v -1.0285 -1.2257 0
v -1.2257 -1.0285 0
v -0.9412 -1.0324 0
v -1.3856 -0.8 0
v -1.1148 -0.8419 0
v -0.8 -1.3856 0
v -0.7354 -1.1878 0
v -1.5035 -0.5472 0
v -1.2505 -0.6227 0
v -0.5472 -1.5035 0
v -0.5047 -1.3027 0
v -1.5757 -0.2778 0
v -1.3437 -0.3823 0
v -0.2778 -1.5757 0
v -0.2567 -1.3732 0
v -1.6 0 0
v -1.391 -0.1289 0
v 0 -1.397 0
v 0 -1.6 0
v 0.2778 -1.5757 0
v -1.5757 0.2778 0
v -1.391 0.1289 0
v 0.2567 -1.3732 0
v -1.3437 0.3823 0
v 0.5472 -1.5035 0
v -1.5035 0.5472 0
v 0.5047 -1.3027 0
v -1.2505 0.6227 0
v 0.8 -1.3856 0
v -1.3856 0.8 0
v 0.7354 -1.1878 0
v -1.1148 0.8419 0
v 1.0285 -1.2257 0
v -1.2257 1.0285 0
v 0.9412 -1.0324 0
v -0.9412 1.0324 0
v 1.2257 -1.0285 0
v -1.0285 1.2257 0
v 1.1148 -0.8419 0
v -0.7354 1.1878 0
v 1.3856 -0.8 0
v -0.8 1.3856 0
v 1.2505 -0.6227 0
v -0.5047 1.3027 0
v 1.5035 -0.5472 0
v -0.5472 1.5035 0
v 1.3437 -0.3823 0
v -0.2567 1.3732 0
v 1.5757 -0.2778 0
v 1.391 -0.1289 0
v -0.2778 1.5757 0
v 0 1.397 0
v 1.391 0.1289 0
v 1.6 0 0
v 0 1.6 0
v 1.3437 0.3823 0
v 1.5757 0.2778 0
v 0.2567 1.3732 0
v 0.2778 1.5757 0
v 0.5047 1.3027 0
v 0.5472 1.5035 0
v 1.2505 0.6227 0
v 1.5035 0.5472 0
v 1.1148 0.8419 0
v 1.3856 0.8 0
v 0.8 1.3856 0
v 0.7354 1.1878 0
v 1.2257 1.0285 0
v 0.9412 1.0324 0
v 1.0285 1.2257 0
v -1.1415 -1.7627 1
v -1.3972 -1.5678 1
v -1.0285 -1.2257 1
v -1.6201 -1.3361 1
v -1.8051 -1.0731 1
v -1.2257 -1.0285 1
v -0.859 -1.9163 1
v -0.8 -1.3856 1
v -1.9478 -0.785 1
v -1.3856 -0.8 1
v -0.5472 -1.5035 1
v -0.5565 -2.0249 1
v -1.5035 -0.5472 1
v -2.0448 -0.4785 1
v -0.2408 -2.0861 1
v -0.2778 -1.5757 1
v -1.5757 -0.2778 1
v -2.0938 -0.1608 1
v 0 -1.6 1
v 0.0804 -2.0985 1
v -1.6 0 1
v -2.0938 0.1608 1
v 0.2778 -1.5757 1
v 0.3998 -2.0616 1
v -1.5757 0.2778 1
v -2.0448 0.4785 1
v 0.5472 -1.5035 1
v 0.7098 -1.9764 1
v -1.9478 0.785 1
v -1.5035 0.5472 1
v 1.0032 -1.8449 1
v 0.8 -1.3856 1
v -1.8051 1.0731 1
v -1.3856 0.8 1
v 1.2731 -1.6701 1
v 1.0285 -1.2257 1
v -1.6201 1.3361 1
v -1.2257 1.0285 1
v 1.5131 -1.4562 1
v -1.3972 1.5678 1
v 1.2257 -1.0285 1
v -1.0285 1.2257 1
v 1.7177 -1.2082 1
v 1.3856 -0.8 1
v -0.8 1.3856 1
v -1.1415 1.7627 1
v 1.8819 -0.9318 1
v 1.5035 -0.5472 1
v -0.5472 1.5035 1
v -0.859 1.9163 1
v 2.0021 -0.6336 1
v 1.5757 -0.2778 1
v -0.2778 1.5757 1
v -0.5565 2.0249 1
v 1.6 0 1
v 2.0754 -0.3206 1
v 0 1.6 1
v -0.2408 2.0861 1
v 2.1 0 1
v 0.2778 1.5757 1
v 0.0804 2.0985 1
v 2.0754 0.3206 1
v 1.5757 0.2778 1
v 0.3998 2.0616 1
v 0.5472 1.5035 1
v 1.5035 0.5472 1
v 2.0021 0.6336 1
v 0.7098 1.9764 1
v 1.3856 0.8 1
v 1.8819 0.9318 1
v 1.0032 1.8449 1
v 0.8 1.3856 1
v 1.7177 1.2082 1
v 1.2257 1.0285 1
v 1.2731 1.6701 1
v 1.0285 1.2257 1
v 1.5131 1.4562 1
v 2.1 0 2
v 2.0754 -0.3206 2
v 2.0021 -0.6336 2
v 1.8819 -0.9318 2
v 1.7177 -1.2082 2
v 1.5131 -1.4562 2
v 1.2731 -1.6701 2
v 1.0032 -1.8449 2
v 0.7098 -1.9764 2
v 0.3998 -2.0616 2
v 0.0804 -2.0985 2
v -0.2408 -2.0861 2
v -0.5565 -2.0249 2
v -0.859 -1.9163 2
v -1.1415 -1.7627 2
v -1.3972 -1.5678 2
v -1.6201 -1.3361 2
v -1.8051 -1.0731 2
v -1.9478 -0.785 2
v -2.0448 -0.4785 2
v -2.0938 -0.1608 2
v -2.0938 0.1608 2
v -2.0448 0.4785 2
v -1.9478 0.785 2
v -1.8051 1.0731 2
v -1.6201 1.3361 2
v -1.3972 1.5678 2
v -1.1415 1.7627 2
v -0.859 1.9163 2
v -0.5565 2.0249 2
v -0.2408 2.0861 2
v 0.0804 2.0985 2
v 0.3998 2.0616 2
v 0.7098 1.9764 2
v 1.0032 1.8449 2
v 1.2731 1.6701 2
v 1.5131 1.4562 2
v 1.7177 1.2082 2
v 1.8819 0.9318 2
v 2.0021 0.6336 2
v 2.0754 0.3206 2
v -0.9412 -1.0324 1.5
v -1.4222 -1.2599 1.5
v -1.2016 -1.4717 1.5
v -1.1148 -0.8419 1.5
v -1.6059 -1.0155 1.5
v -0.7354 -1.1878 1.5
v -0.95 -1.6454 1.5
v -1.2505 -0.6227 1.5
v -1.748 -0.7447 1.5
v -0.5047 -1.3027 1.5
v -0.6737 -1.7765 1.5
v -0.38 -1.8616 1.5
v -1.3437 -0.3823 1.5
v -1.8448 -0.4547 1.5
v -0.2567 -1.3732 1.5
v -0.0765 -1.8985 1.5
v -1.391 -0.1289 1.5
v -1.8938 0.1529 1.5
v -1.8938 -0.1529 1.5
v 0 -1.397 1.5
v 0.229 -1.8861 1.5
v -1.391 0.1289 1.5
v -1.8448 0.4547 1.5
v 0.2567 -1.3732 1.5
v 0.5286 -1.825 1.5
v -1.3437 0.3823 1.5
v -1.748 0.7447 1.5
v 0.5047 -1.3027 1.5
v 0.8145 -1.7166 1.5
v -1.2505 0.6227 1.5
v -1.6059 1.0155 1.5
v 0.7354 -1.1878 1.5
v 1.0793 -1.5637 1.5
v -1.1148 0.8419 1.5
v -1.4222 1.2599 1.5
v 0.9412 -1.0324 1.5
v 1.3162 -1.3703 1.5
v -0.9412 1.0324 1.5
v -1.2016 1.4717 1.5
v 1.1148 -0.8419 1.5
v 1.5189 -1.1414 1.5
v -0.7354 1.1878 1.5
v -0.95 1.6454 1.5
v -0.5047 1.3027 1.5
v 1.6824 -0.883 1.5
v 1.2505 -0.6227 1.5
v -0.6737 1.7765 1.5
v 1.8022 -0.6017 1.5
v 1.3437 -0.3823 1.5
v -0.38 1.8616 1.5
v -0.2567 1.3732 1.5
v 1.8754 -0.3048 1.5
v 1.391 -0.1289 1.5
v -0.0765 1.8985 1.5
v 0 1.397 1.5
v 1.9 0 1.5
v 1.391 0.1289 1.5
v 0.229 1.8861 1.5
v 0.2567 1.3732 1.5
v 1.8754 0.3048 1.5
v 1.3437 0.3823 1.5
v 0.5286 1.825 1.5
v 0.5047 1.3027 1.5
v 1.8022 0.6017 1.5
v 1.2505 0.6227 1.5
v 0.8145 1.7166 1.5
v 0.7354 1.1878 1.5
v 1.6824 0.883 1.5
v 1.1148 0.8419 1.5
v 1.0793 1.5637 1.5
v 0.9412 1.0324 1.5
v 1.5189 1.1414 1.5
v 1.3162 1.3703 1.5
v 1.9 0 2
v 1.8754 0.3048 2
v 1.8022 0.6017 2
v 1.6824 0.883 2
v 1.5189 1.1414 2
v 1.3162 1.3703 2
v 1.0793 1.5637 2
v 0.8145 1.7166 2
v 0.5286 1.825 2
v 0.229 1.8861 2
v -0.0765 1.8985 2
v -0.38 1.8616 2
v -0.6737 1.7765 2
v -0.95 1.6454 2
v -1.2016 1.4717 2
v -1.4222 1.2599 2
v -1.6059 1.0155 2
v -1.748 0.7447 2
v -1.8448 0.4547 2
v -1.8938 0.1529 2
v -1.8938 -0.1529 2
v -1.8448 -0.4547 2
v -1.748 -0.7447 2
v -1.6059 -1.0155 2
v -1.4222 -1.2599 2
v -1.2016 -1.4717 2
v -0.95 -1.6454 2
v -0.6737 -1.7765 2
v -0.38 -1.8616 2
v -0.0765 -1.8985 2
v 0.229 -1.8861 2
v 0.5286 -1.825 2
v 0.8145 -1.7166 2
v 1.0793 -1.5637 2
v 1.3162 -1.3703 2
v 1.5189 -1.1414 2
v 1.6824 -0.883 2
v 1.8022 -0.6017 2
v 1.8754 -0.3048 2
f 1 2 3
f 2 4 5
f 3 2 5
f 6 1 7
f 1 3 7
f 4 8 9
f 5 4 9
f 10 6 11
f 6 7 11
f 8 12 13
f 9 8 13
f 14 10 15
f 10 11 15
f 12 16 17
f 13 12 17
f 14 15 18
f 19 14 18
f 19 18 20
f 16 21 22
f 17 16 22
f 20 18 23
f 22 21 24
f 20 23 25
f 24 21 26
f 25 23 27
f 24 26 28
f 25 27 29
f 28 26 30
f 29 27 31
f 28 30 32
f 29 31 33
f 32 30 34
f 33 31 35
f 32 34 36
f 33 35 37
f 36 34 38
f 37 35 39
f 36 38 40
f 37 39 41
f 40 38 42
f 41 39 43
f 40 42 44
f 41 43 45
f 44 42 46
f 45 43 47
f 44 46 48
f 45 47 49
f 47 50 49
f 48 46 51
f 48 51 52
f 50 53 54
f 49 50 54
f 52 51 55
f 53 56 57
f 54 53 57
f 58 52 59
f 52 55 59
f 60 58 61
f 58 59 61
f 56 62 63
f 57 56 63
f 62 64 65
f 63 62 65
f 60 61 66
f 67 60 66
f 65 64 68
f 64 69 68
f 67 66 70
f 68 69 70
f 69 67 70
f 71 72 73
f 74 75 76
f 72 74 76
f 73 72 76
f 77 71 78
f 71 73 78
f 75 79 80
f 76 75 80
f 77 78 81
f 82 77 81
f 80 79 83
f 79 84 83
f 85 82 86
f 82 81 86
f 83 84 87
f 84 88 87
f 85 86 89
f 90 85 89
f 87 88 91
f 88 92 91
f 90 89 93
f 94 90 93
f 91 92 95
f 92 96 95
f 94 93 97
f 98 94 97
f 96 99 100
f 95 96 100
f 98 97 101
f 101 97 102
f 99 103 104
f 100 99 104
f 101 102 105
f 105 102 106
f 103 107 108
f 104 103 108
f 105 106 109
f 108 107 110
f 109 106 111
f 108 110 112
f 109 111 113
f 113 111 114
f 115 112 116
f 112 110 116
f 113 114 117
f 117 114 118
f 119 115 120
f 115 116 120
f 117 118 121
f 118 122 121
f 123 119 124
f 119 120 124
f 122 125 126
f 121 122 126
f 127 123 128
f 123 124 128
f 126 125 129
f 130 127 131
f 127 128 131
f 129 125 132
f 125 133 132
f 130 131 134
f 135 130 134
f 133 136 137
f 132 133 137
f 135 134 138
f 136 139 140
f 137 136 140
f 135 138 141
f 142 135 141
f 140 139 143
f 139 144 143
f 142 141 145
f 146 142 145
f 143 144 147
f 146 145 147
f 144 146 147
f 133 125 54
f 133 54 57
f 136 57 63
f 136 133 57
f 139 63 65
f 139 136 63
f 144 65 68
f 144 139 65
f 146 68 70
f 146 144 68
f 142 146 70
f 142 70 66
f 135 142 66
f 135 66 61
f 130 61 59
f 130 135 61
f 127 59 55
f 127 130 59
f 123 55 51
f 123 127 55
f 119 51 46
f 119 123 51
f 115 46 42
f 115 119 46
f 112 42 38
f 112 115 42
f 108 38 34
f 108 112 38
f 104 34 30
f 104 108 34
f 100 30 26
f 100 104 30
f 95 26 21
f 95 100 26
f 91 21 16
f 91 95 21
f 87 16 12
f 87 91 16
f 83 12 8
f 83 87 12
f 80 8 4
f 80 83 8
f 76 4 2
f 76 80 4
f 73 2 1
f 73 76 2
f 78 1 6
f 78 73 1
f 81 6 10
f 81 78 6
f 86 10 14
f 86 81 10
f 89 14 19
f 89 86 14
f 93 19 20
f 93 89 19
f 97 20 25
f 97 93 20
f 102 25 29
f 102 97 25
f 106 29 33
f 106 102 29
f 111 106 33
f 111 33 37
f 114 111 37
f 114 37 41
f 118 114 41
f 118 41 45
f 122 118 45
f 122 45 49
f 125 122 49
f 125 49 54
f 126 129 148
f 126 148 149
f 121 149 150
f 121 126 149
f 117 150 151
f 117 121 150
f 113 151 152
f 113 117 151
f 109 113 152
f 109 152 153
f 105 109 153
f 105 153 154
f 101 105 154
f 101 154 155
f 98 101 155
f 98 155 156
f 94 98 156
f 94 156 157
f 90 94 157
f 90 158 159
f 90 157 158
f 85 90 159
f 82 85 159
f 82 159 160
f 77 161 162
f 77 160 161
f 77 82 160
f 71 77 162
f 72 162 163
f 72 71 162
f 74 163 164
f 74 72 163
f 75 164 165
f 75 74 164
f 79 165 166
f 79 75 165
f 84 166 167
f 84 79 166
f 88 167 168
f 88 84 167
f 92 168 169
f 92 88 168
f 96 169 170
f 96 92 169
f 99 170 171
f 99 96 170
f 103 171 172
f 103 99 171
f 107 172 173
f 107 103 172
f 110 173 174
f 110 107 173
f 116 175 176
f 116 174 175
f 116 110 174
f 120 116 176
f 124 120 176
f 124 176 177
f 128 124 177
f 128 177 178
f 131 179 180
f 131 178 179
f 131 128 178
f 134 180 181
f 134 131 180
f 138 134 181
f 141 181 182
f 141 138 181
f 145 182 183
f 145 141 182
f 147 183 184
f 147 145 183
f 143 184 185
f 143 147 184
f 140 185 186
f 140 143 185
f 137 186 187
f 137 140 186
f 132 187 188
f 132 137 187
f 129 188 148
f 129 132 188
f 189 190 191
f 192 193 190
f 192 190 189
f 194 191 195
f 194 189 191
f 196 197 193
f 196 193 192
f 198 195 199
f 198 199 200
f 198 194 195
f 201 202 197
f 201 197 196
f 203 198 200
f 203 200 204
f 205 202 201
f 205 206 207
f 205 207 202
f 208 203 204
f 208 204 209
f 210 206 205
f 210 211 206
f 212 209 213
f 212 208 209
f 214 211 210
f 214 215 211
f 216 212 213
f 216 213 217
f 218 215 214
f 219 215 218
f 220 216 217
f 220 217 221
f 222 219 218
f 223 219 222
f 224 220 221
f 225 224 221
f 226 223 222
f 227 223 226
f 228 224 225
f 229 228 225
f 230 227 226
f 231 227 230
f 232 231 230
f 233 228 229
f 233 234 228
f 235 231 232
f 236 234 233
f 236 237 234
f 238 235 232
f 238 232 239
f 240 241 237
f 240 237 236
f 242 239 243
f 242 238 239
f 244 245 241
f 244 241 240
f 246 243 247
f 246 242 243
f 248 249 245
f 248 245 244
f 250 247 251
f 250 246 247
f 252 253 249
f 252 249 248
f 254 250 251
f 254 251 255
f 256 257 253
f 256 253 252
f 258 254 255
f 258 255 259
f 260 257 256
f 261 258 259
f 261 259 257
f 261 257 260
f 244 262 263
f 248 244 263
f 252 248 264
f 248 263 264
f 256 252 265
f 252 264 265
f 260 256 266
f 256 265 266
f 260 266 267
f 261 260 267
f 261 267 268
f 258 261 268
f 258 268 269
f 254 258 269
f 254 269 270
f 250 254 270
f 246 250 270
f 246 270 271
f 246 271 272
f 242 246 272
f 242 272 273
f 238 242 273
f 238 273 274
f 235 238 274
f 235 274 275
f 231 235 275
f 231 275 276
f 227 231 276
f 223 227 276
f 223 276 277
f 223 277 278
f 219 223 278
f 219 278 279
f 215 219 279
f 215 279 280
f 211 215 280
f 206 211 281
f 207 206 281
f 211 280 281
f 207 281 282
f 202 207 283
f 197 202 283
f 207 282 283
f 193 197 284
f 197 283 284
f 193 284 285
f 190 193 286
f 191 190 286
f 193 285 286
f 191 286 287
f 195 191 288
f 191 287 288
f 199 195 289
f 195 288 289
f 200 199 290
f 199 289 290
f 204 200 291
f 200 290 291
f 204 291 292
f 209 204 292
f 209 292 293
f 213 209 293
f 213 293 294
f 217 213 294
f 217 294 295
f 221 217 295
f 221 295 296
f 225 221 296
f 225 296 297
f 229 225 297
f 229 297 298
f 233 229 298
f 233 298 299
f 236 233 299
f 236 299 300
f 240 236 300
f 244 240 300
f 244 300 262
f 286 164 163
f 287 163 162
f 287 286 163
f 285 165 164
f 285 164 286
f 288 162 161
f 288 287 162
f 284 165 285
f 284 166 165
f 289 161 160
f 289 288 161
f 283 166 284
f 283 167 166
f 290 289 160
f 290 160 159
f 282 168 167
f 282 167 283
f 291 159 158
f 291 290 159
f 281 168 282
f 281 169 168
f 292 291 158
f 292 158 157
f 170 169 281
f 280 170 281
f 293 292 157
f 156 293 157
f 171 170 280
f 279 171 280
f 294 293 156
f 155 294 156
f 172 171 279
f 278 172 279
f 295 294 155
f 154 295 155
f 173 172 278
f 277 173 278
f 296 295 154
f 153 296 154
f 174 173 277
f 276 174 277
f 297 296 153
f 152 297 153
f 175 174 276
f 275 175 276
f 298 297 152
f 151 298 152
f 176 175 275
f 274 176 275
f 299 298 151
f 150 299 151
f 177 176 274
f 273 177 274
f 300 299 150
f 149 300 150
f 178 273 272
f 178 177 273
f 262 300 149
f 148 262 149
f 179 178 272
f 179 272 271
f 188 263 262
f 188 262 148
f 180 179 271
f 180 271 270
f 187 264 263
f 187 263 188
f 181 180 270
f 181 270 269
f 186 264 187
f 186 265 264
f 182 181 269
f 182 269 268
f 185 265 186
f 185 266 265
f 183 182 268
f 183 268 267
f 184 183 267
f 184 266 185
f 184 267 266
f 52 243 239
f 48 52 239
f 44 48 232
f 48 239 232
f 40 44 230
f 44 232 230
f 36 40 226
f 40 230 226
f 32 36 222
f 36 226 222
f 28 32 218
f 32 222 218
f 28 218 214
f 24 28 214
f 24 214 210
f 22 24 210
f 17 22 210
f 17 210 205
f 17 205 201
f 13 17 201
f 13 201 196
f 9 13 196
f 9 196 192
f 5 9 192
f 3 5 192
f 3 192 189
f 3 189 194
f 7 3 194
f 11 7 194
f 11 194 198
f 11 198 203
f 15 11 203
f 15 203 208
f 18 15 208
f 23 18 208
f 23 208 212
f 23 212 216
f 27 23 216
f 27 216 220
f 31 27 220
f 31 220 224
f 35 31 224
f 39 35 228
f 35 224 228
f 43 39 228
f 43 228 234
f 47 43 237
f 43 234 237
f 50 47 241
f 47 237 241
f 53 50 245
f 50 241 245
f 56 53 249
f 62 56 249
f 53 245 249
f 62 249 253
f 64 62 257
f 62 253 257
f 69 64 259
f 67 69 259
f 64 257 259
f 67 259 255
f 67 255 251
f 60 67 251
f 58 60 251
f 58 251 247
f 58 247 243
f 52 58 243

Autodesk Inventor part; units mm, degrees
ref_plane "YZ Plane" through (0, 0, 0) normal (1, 0, 0) x (0, 1, 0)
ref_plane "XZ Plane" through (0, 0, 0) normal (0, 1, 0) x (-1, 0, 0)
ref_plane "XY Plane" through (0, 0, 0) normal (0, 0, 1) x (1, 0, 0)
sketch "Sketch1" plane through (0, 0, 0) normal (0, 0, 1) x (1, 0, 0)
  circle A0 centre (0, 0) radius 1.5
  circle A1 centre (0, 0) radius 2.1
  dimension "d0" = 3
  dimension "d1" = 4.2
extrude "Extrusion1" add sketch "Sketch1" along normal blind 2 contours A0 | A1
sketch "Sketch2" plane through (0, 0, 2) normal (0, 0, 1) x (1, 0, 0)
  circle A0 centre (0, 0) radius 1.5 projected
  circle A1 centre (0, 0) radius 2.1 projected
  circle A2 centre (0, 0) radius 1.9
  dimension "d4" = 3.8
extrude "Extrusion2" cut sketch "Sketch2" against normal blind 0.5 contours A0 | A2
sketch "Sketch3" plane through (0, 0, 0) normal (0, 0, -1) x (-1, 0, 0)
  circle A0 centre (0, 0) radius 1.5 projected
  circle A1 centre (0, 0) radius 2.1 projected
  circle A2 centre (0, 0) radius 1.9
  dimension "d7" = 3.8
extrude "Extrusion3" [suppressed]
ref_plane "Work Plane1" through (0, 0, 1) normal (0, 0, 1) x (1, 0, 0)
sketch "Sketch4" plane through (0, 0, 1) normal (0, 0, 1) x (1, 0, 0)
  circle A0 centre (0, 0) radius 1.6
  circle A1 centre (0, 0) radius 2.1 projected
  dimension "d11" = 3.2
extrude "Extrusion4" cut sketch "Sketch4" against normal through all
sketch "Sketch5" plane through (0, 0, 0) normal (0, 0, -1) x (-1, 0, 0)
  circle A0 centre (0, 0) radius 1.6 projected
  circle A1 centre (0, 0) radius 1.4
  dimension "d14" = 2.8
hole "Hole1" at (0, 0, 0) direction (0, 0, 1) diameter 2.794 end through all
properties part number "GuideTube" material "Aluminum-6061"
